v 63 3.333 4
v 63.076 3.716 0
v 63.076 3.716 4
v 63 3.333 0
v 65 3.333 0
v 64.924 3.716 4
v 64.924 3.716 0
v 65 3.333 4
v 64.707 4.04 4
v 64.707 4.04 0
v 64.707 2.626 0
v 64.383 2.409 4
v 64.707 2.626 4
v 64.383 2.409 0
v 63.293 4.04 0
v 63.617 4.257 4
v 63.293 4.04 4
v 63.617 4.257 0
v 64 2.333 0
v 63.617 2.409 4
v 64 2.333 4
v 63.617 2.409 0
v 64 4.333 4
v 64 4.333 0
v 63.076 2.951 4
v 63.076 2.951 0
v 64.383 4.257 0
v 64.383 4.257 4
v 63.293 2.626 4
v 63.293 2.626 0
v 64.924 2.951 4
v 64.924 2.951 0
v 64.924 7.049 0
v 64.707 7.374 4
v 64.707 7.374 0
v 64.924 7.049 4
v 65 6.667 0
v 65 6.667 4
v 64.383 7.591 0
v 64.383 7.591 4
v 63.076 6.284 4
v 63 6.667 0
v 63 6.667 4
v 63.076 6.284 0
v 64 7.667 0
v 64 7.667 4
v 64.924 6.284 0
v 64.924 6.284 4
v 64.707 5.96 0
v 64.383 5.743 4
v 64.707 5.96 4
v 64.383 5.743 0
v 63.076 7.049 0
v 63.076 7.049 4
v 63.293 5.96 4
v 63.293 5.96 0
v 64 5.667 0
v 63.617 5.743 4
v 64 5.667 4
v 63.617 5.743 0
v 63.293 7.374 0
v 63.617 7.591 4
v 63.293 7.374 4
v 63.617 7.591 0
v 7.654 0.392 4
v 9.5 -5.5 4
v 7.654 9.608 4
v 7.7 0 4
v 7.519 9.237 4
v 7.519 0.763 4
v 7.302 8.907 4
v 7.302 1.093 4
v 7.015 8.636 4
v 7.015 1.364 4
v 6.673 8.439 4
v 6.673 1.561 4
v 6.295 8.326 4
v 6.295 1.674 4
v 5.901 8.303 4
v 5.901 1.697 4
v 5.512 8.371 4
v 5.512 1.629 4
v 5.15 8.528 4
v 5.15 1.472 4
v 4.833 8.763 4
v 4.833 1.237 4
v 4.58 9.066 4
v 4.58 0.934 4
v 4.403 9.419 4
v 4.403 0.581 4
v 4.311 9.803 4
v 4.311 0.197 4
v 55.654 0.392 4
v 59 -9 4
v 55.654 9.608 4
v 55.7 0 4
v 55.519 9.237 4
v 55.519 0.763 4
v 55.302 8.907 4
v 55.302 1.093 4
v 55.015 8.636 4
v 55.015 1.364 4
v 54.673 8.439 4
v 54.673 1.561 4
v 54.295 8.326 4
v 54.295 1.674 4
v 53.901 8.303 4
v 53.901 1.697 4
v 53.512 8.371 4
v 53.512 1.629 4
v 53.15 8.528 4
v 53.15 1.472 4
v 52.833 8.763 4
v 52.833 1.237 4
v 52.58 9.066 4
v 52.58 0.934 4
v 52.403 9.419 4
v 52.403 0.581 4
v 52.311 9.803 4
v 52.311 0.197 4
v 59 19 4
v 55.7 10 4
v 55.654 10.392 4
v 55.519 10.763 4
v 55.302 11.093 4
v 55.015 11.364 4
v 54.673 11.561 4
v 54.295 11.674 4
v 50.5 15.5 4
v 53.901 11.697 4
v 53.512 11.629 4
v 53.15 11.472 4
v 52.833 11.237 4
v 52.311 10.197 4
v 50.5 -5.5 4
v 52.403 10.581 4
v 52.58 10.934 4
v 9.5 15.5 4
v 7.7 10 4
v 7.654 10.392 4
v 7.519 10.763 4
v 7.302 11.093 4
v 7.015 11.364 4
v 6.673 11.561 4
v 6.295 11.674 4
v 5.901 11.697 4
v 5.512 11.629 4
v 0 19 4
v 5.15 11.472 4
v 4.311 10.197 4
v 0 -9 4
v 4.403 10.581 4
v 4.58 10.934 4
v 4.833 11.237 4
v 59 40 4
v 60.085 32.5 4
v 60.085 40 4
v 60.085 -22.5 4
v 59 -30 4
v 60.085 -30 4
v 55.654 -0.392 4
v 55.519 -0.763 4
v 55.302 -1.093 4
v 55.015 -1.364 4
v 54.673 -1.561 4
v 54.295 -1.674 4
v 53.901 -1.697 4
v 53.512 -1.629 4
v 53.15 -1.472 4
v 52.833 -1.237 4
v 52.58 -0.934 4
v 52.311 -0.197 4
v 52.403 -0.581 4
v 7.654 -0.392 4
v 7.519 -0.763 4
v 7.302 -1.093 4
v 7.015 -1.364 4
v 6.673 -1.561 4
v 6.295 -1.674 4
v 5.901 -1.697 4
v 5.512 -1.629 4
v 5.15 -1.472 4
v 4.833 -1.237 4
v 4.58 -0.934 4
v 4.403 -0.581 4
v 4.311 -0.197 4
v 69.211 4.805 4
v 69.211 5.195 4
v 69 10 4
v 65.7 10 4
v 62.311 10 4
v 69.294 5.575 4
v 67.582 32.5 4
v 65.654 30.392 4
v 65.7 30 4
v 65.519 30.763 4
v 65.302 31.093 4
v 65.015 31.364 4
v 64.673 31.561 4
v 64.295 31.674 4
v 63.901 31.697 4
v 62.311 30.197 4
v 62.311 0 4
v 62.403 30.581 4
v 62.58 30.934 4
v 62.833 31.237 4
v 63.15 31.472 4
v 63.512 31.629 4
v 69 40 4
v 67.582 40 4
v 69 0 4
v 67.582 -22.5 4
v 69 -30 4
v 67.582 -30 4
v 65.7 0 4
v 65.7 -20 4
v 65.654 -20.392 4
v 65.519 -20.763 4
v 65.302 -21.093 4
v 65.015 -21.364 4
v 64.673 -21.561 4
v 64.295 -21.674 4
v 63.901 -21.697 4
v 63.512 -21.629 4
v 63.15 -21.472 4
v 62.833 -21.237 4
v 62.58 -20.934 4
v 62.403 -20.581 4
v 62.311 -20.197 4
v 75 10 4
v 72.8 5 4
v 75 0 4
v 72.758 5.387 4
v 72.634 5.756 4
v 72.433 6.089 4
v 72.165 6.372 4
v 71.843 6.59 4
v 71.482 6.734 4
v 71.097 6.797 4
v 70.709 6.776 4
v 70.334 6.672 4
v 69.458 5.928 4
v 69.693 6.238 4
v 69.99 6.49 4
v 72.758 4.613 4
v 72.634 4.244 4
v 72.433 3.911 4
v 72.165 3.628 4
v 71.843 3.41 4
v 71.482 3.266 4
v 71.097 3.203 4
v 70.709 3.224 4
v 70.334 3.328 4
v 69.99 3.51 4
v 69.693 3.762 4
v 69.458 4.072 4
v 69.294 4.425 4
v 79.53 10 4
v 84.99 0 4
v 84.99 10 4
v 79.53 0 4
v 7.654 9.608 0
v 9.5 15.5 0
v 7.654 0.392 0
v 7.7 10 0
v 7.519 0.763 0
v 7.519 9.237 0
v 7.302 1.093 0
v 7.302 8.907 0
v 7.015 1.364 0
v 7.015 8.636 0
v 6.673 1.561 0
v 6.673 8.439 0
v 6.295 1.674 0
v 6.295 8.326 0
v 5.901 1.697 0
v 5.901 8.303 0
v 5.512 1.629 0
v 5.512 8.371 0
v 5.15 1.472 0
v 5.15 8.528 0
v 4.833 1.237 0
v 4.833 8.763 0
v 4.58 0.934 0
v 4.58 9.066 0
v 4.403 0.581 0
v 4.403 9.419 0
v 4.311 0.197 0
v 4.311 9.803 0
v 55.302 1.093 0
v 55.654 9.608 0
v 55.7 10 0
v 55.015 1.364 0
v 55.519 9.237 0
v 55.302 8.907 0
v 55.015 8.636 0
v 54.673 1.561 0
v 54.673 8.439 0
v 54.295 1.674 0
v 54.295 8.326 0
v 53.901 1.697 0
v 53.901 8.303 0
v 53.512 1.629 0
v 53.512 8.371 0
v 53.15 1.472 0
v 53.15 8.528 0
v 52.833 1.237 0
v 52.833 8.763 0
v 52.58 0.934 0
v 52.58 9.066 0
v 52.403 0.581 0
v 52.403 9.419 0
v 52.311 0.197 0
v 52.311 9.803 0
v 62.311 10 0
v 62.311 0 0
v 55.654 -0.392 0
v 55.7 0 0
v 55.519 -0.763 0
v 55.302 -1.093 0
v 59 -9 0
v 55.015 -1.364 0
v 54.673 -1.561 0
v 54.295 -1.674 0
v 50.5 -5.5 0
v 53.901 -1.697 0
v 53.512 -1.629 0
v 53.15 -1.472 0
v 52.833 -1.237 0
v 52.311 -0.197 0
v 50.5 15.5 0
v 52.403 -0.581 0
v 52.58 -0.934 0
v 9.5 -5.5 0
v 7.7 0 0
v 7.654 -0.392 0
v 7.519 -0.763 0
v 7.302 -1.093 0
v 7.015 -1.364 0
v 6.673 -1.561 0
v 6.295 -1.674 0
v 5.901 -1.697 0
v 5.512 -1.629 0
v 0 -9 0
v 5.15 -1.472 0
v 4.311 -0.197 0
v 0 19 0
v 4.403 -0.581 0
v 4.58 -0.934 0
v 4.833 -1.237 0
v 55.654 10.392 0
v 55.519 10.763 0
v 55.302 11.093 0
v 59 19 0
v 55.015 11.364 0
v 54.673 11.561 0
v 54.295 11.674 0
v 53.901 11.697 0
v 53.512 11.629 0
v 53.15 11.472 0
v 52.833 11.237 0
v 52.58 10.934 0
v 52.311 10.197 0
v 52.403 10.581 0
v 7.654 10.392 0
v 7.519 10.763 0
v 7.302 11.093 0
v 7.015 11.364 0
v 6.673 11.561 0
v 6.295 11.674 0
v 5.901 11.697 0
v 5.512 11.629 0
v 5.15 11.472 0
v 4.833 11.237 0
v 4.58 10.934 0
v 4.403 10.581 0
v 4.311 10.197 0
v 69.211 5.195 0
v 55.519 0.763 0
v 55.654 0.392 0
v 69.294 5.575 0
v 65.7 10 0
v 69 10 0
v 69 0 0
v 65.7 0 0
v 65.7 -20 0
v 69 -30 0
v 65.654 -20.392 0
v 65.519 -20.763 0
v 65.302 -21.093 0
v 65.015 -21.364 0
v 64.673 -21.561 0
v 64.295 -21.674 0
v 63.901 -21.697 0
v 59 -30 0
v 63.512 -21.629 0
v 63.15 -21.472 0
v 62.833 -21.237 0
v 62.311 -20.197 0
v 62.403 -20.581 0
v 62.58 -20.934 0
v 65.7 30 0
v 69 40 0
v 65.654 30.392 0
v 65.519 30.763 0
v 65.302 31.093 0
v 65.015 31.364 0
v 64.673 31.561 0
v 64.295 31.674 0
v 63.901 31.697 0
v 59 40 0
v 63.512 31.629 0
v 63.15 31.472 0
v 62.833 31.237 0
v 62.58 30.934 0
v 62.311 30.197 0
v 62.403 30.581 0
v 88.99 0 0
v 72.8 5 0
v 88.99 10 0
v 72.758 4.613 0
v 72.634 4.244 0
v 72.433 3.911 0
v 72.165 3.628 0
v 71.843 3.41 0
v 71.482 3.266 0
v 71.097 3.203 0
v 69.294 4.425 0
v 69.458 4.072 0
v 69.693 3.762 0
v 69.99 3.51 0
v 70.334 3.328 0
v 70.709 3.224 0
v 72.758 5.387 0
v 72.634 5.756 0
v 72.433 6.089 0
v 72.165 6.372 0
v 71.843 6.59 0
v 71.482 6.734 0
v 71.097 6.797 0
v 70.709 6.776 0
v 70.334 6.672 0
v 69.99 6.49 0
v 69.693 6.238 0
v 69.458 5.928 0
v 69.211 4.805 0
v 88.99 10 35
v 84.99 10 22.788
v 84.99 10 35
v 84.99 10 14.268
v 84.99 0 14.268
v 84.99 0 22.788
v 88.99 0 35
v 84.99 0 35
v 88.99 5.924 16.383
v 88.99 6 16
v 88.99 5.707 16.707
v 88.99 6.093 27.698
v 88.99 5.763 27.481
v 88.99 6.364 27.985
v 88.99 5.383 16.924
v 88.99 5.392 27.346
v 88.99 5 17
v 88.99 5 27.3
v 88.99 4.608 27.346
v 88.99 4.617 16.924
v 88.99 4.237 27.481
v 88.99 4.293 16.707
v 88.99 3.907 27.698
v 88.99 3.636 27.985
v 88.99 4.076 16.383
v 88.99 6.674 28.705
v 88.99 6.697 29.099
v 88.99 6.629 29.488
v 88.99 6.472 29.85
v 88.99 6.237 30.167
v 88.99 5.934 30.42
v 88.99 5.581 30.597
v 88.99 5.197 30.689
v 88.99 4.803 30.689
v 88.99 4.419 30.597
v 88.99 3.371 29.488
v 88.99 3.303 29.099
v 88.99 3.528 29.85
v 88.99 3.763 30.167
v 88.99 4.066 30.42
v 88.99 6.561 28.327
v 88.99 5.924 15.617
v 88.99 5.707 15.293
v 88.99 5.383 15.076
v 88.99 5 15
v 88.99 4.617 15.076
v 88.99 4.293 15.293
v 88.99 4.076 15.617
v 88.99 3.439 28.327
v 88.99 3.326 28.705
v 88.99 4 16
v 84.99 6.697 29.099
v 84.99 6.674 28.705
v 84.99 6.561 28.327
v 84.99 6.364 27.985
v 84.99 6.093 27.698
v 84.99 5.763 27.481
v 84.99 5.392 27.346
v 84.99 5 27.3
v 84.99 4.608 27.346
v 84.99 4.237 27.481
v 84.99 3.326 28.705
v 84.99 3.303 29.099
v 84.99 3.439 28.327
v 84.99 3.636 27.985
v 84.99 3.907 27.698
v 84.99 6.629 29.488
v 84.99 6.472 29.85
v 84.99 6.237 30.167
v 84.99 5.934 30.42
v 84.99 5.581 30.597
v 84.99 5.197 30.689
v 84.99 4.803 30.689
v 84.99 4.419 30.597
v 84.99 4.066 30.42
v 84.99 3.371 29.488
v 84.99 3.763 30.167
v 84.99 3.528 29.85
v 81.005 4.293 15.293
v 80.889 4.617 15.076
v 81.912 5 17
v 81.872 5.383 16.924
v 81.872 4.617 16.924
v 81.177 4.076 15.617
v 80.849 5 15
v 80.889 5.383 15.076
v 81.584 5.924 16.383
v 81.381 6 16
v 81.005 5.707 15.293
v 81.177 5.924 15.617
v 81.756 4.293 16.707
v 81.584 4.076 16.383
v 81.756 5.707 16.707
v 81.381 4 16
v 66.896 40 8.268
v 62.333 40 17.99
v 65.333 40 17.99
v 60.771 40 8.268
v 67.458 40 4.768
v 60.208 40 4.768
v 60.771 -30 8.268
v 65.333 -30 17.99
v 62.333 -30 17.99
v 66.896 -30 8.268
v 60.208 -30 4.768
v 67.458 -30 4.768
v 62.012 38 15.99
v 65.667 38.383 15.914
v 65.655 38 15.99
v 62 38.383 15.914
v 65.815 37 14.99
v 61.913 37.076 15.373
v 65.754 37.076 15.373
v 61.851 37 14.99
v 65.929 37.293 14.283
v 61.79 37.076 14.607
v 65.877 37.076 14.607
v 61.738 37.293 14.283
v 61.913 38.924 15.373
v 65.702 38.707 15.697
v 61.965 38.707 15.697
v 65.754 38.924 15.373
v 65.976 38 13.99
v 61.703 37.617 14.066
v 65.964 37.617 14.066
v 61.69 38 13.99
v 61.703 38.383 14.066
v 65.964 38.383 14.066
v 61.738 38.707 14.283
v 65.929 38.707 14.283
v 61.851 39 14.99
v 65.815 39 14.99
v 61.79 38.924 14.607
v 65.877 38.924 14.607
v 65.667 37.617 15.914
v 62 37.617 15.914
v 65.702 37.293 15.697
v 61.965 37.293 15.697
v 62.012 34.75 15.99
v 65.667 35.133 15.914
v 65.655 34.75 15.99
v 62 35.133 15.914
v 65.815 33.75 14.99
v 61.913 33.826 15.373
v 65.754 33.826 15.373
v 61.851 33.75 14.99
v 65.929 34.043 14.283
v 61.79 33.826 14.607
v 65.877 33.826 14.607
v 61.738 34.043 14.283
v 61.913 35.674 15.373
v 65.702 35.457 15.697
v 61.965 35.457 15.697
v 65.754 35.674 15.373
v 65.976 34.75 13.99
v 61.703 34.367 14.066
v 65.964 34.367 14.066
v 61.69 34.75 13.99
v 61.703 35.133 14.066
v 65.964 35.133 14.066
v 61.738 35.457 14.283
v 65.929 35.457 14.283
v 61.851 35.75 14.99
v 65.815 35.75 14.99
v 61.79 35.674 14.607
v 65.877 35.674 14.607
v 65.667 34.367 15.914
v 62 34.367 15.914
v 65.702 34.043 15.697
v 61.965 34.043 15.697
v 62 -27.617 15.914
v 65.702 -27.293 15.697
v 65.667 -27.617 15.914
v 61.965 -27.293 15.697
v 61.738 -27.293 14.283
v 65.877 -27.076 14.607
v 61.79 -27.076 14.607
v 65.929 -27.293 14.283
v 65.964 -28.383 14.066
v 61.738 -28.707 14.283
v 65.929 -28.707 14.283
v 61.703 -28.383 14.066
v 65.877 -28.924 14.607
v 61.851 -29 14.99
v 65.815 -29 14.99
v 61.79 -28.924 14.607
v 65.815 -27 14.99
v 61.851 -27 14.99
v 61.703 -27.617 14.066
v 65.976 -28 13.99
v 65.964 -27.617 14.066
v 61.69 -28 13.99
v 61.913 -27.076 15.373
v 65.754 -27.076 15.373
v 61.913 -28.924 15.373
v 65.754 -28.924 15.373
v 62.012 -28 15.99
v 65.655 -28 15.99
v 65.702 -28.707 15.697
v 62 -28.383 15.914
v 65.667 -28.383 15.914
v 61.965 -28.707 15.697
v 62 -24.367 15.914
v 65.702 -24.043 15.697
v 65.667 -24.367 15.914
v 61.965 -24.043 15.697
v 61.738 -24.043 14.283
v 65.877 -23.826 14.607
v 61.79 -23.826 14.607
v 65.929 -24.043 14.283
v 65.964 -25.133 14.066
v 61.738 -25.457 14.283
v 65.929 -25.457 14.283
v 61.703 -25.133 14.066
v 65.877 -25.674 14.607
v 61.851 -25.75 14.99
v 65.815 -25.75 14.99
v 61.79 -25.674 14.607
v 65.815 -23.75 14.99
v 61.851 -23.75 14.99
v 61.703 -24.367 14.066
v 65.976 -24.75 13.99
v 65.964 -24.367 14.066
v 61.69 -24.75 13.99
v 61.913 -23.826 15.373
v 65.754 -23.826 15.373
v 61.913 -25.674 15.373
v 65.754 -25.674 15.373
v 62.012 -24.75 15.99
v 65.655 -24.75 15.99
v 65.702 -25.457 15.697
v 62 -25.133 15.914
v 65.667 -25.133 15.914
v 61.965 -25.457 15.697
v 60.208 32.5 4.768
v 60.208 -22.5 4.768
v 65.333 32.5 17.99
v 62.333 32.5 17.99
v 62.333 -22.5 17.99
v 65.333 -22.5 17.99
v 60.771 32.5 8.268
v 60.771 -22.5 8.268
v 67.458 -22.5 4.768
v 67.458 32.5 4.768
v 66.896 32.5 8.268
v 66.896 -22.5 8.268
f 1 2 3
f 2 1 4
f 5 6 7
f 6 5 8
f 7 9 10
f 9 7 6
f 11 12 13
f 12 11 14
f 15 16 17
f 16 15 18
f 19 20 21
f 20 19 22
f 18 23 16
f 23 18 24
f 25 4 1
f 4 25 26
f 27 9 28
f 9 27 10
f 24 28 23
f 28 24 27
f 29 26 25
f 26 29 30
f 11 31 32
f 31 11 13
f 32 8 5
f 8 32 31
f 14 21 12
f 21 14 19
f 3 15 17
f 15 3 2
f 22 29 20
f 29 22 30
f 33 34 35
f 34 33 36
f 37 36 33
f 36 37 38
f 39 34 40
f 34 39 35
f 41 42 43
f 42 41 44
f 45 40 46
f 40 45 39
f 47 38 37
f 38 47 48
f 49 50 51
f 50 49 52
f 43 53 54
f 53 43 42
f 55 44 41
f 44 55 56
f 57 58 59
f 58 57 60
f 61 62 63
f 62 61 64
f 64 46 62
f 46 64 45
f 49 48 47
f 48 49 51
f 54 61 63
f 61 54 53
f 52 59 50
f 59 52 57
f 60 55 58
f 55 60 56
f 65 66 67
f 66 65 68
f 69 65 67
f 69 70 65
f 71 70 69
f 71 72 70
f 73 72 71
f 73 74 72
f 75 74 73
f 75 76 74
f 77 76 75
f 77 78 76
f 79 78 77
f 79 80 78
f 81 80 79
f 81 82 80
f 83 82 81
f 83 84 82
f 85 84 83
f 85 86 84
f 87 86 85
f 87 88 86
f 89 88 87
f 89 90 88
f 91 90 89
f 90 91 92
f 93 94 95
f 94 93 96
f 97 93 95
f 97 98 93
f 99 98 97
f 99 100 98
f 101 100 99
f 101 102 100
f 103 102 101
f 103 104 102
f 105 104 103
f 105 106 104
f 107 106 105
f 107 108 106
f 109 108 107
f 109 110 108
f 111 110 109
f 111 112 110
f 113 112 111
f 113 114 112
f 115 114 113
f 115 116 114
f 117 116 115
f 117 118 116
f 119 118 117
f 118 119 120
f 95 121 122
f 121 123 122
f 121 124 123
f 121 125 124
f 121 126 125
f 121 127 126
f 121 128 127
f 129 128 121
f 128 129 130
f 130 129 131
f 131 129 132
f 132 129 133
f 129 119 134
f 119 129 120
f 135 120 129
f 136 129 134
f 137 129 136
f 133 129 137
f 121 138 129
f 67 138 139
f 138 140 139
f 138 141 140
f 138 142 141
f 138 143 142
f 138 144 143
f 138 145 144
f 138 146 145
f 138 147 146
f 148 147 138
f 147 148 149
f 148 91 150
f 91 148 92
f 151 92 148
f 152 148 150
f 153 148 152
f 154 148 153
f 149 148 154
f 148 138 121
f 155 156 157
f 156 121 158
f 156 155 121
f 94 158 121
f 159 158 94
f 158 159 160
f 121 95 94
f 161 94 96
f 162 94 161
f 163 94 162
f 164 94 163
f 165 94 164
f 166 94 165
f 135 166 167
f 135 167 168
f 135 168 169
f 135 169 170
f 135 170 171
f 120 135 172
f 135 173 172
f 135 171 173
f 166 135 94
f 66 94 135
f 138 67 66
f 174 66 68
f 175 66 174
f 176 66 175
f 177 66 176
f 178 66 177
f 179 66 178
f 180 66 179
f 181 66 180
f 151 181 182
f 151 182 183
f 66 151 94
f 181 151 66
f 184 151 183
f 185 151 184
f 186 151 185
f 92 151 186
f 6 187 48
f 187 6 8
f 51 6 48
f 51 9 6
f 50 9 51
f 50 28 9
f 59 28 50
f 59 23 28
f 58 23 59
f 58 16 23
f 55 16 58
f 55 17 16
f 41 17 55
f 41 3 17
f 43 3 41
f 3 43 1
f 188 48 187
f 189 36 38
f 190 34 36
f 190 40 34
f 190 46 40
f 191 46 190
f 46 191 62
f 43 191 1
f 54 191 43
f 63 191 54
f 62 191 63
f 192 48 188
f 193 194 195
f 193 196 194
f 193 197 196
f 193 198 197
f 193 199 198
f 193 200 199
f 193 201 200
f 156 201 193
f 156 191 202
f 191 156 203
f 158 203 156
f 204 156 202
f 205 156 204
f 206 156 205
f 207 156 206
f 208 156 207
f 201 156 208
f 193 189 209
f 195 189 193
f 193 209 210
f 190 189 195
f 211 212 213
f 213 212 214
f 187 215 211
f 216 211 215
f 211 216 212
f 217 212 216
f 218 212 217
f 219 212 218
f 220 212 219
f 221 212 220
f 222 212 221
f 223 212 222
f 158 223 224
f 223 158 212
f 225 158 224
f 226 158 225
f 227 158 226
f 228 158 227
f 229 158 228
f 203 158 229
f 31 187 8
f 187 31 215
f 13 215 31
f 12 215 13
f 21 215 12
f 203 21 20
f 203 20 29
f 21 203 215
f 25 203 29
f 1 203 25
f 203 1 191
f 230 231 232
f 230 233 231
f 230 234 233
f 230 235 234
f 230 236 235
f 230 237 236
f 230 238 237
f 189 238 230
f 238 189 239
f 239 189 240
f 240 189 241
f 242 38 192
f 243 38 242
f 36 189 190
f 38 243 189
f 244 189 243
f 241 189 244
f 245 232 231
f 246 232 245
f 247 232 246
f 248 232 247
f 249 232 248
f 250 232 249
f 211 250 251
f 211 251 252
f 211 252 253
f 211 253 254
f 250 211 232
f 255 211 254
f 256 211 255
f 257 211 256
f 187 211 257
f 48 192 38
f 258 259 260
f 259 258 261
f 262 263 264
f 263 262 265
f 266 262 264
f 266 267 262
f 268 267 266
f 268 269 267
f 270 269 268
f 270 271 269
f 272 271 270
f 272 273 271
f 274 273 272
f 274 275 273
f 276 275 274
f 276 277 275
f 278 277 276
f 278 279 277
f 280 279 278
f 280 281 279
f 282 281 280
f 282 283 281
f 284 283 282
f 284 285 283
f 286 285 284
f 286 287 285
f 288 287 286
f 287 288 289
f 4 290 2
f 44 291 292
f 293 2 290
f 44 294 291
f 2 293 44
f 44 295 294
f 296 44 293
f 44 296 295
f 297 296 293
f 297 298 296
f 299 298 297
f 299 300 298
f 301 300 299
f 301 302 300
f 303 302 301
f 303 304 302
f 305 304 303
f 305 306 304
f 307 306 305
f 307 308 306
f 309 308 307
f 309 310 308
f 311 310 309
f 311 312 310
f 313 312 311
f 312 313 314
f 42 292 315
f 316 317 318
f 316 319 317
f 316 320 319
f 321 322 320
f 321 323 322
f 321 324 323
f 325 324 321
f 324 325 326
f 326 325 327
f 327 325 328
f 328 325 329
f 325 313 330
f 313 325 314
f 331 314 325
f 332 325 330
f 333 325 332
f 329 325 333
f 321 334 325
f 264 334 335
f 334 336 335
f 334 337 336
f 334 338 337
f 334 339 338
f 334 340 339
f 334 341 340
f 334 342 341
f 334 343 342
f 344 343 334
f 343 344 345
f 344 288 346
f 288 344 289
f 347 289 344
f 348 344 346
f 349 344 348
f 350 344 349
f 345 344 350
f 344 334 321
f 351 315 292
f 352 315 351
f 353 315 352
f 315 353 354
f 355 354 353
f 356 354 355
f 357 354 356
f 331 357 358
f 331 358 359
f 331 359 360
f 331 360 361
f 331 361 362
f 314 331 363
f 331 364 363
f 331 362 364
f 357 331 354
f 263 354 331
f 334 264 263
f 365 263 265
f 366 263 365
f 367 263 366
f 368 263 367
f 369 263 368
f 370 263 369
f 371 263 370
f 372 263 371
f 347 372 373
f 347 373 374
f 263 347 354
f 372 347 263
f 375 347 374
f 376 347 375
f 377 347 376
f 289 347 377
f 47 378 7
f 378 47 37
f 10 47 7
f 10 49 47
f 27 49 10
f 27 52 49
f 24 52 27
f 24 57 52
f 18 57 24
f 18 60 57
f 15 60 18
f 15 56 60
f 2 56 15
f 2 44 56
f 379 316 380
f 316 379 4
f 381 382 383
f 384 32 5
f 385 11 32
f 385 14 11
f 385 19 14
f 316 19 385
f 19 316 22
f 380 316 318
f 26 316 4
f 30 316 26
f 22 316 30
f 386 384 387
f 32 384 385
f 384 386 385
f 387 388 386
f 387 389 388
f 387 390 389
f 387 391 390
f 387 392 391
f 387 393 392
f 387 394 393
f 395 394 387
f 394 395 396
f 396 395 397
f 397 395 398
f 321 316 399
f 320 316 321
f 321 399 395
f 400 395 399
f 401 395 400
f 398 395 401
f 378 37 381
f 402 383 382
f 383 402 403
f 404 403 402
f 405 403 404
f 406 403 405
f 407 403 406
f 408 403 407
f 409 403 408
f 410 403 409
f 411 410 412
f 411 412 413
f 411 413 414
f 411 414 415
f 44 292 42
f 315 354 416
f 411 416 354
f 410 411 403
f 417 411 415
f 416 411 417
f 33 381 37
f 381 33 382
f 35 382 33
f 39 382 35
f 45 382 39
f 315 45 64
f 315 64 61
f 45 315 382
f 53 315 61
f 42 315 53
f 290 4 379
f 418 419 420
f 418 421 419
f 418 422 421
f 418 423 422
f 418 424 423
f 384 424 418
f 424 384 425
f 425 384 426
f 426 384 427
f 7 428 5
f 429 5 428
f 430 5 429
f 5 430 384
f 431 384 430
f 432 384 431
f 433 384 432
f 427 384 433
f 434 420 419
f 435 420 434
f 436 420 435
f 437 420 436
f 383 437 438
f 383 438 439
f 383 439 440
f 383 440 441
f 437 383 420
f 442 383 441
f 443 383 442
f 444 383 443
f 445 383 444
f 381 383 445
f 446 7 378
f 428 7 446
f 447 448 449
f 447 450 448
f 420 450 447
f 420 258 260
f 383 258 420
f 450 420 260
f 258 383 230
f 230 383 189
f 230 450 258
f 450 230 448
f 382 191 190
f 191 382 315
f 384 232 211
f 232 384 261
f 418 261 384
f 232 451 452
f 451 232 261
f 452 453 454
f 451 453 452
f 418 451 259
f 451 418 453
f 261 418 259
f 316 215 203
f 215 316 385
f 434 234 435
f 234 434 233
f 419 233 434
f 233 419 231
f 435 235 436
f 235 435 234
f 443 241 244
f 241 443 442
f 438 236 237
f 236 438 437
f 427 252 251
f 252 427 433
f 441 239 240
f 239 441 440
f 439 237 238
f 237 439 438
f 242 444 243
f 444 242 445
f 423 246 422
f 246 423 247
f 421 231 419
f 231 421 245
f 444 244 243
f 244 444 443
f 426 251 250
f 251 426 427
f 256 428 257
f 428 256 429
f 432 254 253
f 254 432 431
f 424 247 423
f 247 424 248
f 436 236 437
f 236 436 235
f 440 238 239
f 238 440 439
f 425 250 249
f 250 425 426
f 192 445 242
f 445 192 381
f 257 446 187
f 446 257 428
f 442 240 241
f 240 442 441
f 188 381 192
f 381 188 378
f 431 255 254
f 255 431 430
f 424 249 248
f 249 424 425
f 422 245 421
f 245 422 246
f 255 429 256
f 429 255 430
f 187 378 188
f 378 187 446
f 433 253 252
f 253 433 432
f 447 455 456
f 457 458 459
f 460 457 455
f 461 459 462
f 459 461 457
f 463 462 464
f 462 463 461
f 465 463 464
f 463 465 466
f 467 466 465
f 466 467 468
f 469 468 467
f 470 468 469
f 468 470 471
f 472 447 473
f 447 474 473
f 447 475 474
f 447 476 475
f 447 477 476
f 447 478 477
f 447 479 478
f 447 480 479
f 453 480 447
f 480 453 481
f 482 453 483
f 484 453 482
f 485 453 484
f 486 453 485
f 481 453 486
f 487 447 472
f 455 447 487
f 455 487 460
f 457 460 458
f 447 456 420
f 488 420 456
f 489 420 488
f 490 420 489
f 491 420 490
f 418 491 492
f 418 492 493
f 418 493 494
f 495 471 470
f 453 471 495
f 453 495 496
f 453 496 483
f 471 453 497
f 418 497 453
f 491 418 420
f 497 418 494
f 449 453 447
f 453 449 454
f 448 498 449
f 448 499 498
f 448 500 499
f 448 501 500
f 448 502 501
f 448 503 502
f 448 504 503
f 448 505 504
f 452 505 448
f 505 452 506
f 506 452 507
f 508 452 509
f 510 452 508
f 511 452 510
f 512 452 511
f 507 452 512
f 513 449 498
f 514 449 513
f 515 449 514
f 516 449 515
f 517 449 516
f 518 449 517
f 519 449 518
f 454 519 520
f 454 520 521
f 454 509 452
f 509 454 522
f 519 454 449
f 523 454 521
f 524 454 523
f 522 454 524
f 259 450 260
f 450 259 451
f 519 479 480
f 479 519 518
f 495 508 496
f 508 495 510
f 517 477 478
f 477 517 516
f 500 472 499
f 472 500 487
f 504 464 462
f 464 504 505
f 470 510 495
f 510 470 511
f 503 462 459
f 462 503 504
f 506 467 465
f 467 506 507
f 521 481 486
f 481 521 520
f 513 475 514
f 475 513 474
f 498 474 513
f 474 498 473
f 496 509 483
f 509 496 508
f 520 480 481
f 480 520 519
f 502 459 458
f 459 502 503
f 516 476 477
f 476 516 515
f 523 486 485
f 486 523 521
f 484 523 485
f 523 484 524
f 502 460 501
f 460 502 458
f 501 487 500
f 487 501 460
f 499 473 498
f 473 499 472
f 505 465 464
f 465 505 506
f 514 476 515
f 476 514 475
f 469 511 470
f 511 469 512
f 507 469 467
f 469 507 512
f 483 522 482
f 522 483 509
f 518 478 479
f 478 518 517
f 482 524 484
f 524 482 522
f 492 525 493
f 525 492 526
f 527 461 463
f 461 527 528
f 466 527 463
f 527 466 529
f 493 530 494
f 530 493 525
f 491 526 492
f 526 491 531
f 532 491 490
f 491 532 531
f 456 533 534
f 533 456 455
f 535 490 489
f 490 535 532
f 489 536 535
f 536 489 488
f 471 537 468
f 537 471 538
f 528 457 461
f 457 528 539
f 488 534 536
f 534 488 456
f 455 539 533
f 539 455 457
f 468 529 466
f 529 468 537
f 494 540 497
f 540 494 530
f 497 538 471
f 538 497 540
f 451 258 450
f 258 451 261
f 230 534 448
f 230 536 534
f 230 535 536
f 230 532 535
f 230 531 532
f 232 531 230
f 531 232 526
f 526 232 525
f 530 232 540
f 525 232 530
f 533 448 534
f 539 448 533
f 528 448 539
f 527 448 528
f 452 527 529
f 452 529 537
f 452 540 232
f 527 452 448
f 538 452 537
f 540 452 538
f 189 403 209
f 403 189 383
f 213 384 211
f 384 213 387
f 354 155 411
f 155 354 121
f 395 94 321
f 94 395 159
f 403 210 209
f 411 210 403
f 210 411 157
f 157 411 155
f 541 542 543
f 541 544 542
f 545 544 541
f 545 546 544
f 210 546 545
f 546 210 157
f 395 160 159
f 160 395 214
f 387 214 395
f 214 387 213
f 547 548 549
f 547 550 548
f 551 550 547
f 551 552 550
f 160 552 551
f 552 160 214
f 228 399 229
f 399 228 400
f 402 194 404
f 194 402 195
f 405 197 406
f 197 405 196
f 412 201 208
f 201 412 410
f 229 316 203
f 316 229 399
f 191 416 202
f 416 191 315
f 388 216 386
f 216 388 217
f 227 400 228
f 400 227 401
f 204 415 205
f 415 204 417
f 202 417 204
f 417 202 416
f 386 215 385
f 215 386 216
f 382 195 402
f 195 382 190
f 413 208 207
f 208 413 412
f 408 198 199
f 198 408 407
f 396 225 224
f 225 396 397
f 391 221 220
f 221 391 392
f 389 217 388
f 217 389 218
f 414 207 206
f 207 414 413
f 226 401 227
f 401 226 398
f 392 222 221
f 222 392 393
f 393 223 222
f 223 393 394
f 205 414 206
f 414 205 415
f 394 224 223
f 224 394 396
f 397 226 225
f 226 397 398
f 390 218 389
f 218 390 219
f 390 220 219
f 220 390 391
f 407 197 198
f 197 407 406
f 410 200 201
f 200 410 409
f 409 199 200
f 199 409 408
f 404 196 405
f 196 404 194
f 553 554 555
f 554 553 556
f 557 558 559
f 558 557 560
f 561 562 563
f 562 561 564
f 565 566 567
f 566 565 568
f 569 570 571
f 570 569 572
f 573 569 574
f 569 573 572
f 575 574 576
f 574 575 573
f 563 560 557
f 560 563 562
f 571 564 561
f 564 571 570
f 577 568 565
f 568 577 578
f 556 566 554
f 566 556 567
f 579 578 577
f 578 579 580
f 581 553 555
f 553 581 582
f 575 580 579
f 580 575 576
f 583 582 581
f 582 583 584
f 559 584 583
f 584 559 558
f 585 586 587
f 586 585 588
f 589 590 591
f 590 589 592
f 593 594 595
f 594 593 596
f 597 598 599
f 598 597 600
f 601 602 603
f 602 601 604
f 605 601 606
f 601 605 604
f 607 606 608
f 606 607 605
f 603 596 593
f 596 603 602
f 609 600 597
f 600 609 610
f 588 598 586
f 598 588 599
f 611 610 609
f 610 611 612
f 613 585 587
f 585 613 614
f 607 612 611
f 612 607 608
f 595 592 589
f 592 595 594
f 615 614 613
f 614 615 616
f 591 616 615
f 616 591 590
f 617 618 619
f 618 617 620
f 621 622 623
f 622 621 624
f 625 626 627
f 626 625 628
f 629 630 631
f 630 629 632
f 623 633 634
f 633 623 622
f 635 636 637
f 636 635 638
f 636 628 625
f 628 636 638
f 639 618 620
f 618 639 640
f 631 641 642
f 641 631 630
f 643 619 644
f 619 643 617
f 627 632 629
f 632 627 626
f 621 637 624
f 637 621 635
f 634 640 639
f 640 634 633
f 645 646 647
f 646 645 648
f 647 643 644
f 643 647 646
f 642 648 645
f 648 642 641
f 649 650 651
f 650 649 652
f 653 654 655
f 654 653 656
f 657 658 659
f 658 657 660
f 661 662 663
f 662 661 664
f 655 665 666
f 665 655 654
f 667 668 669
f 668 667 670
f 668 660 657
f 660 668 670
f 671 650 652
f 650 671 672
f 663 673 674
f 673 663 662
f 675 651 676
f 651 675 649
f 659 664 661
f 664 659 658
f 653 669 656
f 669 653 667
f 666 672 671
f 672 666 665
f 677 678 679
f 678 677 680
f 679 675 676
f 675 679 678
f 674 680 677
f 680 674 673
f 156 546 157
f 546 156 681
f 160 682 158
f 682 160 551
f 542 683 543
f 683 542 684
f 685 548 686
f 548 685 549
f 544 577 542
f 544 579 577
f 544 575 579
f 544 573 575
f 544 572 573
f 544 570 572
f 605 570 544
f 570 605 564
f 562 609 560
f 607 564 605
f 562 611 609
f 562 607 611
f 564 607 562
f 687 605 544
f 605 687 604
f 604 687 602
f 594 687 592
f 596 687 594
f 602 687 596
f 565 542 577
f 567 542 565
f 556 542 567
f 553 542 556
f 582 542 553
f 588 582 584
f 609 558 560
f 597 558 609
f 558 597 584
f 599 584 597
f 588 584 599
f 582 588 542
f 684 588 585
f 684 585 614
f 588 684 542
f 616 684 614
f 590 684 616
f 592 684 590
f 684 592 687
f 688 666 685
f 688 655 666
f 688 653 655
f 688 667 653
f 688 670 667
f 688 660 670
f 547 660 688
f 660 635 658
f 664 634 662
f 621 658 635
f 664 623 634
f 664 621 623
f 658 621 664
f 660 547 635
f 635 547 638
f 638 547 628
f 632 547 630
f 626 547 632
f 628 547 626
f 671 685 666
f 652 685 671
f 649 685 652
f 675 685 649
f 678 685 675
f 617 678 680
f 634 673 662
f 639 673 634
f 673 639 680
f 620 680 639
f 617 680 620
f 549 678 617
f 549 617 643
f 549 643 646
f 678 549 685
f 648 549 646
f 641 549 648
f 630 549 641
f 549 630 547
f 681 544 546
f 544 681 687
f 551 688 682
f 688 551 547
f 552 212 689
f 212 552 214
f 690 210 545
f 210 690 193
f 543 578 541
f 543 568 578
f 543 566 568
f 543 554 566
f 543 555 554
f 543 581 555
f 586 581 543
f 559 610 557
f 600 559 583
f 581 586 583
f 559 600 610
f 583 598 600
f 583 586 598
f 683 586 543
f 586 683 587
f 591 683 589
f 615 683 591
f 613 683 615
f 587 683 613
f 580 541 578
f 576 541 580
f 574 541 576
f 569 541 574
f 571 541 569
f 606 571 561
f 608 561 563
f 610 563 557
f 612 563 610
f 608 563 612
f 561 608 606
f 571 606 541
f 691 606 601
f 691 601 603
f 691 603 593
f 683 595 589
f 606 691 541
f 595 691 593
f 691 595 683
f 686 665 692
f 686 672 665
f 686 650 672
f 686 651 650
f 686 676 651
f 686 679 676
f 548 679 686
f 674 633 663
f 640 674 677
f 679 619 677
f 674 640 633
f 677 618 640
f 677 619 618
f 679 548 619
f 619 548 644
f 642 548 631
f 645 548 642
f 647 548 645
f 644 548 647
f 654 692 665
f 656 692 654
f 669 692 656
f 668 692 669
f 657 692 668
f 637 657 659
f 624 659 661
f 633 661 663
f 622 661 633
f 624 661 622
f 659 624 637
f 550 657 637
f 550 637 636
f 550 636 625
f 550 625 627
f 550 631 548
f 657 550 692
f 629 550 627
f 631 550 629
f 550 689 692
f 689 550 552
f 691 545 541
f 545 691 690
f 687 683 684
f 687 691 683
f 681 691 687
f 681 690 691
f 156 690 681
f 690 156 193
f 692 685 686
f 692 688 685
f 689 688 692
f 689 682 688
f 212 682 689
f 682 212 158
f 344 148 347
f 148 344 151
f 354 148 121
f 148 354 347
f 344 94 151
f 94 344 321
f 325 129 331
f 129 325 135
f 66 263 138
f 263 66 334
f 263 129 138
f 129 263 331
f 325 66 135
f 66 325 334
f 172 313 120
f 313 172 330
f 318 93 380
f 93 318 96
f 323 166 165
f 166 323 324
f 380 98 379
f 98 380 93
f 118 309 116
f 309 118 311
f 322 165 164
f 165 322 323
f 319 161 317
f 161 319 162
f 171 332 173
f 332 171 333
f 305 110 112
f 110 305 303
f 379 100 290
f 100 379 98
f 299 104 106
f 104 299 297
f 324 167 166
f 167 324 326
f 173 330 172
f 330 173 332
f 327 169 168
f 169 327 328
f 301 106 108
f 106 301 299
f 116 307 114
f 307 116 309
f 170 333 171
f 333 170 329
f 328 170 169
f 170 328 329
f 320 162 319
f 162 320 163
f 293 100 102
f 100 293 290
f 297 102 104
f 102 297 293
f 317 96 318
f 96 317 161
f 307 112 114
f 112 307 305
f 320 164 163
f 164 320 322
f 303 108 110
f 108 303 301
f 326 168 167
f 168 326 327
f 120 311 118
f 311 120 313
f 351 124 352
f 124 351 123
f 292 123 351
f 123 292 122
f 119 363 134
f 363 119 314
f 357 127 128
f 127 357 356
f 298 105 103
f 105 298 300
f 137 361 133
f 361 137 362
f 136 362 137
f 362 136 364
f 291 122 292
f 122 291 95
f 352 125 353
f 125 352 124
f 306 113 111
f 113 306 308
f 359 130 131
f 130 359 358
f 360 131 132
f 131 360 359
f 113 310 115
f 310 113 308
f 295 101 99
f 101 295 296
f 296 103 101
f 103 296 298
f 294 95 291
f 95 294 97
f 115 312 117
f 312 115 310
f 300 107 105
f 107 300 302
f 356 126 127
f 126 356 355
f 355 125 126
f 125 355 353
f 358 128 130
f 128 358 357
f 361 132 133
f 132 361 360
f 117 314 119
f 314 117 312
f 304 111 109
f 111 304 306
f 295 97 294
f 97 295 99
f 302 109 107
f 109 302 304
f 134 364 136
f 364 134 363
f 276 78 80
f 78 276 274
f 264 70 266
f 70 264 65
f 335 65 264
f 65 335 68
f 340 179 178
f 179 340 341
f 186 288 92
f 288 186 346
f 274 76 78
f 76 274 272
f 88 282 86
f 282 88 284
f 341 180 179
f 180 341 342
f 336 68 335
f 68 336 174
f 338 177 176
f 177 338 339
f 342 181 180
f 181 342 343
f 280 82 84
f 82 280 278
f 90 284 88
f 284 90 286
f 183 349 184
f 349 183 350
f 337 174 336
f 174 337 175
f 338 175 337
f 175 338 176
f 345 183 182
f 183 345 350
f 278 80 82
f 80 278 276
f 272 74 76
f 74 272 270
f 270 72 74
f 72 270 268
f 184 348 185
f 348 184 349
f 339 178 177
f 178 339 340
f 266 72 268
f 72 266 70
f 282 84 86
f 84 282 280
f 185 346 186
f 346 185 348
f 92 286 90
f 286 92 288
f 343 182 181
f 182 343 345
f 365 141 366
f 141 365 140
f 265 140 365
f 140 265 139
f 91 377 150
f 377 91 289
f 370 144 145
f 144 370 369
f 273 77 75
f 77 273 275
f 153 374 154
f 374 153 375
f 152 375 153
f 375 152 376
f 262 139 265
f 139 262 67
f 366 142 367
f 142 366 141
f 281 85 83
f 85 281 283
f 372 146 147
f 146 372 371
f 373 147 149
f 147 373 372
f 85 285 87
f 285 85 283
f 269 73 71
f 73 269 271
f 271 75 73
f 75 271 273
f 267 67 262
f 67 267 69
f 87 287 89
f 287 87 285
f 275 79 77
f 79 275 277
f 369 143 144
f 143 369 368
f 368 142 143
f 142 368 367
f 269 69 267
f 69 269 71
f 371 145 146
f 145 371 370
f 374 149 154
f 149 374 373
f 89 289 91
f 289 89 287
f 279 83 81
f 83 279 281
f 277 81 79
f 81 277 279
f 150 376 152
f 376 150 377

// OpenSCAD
include <lib/tentacle.scad>


servo_mount(high_vertical=false);
